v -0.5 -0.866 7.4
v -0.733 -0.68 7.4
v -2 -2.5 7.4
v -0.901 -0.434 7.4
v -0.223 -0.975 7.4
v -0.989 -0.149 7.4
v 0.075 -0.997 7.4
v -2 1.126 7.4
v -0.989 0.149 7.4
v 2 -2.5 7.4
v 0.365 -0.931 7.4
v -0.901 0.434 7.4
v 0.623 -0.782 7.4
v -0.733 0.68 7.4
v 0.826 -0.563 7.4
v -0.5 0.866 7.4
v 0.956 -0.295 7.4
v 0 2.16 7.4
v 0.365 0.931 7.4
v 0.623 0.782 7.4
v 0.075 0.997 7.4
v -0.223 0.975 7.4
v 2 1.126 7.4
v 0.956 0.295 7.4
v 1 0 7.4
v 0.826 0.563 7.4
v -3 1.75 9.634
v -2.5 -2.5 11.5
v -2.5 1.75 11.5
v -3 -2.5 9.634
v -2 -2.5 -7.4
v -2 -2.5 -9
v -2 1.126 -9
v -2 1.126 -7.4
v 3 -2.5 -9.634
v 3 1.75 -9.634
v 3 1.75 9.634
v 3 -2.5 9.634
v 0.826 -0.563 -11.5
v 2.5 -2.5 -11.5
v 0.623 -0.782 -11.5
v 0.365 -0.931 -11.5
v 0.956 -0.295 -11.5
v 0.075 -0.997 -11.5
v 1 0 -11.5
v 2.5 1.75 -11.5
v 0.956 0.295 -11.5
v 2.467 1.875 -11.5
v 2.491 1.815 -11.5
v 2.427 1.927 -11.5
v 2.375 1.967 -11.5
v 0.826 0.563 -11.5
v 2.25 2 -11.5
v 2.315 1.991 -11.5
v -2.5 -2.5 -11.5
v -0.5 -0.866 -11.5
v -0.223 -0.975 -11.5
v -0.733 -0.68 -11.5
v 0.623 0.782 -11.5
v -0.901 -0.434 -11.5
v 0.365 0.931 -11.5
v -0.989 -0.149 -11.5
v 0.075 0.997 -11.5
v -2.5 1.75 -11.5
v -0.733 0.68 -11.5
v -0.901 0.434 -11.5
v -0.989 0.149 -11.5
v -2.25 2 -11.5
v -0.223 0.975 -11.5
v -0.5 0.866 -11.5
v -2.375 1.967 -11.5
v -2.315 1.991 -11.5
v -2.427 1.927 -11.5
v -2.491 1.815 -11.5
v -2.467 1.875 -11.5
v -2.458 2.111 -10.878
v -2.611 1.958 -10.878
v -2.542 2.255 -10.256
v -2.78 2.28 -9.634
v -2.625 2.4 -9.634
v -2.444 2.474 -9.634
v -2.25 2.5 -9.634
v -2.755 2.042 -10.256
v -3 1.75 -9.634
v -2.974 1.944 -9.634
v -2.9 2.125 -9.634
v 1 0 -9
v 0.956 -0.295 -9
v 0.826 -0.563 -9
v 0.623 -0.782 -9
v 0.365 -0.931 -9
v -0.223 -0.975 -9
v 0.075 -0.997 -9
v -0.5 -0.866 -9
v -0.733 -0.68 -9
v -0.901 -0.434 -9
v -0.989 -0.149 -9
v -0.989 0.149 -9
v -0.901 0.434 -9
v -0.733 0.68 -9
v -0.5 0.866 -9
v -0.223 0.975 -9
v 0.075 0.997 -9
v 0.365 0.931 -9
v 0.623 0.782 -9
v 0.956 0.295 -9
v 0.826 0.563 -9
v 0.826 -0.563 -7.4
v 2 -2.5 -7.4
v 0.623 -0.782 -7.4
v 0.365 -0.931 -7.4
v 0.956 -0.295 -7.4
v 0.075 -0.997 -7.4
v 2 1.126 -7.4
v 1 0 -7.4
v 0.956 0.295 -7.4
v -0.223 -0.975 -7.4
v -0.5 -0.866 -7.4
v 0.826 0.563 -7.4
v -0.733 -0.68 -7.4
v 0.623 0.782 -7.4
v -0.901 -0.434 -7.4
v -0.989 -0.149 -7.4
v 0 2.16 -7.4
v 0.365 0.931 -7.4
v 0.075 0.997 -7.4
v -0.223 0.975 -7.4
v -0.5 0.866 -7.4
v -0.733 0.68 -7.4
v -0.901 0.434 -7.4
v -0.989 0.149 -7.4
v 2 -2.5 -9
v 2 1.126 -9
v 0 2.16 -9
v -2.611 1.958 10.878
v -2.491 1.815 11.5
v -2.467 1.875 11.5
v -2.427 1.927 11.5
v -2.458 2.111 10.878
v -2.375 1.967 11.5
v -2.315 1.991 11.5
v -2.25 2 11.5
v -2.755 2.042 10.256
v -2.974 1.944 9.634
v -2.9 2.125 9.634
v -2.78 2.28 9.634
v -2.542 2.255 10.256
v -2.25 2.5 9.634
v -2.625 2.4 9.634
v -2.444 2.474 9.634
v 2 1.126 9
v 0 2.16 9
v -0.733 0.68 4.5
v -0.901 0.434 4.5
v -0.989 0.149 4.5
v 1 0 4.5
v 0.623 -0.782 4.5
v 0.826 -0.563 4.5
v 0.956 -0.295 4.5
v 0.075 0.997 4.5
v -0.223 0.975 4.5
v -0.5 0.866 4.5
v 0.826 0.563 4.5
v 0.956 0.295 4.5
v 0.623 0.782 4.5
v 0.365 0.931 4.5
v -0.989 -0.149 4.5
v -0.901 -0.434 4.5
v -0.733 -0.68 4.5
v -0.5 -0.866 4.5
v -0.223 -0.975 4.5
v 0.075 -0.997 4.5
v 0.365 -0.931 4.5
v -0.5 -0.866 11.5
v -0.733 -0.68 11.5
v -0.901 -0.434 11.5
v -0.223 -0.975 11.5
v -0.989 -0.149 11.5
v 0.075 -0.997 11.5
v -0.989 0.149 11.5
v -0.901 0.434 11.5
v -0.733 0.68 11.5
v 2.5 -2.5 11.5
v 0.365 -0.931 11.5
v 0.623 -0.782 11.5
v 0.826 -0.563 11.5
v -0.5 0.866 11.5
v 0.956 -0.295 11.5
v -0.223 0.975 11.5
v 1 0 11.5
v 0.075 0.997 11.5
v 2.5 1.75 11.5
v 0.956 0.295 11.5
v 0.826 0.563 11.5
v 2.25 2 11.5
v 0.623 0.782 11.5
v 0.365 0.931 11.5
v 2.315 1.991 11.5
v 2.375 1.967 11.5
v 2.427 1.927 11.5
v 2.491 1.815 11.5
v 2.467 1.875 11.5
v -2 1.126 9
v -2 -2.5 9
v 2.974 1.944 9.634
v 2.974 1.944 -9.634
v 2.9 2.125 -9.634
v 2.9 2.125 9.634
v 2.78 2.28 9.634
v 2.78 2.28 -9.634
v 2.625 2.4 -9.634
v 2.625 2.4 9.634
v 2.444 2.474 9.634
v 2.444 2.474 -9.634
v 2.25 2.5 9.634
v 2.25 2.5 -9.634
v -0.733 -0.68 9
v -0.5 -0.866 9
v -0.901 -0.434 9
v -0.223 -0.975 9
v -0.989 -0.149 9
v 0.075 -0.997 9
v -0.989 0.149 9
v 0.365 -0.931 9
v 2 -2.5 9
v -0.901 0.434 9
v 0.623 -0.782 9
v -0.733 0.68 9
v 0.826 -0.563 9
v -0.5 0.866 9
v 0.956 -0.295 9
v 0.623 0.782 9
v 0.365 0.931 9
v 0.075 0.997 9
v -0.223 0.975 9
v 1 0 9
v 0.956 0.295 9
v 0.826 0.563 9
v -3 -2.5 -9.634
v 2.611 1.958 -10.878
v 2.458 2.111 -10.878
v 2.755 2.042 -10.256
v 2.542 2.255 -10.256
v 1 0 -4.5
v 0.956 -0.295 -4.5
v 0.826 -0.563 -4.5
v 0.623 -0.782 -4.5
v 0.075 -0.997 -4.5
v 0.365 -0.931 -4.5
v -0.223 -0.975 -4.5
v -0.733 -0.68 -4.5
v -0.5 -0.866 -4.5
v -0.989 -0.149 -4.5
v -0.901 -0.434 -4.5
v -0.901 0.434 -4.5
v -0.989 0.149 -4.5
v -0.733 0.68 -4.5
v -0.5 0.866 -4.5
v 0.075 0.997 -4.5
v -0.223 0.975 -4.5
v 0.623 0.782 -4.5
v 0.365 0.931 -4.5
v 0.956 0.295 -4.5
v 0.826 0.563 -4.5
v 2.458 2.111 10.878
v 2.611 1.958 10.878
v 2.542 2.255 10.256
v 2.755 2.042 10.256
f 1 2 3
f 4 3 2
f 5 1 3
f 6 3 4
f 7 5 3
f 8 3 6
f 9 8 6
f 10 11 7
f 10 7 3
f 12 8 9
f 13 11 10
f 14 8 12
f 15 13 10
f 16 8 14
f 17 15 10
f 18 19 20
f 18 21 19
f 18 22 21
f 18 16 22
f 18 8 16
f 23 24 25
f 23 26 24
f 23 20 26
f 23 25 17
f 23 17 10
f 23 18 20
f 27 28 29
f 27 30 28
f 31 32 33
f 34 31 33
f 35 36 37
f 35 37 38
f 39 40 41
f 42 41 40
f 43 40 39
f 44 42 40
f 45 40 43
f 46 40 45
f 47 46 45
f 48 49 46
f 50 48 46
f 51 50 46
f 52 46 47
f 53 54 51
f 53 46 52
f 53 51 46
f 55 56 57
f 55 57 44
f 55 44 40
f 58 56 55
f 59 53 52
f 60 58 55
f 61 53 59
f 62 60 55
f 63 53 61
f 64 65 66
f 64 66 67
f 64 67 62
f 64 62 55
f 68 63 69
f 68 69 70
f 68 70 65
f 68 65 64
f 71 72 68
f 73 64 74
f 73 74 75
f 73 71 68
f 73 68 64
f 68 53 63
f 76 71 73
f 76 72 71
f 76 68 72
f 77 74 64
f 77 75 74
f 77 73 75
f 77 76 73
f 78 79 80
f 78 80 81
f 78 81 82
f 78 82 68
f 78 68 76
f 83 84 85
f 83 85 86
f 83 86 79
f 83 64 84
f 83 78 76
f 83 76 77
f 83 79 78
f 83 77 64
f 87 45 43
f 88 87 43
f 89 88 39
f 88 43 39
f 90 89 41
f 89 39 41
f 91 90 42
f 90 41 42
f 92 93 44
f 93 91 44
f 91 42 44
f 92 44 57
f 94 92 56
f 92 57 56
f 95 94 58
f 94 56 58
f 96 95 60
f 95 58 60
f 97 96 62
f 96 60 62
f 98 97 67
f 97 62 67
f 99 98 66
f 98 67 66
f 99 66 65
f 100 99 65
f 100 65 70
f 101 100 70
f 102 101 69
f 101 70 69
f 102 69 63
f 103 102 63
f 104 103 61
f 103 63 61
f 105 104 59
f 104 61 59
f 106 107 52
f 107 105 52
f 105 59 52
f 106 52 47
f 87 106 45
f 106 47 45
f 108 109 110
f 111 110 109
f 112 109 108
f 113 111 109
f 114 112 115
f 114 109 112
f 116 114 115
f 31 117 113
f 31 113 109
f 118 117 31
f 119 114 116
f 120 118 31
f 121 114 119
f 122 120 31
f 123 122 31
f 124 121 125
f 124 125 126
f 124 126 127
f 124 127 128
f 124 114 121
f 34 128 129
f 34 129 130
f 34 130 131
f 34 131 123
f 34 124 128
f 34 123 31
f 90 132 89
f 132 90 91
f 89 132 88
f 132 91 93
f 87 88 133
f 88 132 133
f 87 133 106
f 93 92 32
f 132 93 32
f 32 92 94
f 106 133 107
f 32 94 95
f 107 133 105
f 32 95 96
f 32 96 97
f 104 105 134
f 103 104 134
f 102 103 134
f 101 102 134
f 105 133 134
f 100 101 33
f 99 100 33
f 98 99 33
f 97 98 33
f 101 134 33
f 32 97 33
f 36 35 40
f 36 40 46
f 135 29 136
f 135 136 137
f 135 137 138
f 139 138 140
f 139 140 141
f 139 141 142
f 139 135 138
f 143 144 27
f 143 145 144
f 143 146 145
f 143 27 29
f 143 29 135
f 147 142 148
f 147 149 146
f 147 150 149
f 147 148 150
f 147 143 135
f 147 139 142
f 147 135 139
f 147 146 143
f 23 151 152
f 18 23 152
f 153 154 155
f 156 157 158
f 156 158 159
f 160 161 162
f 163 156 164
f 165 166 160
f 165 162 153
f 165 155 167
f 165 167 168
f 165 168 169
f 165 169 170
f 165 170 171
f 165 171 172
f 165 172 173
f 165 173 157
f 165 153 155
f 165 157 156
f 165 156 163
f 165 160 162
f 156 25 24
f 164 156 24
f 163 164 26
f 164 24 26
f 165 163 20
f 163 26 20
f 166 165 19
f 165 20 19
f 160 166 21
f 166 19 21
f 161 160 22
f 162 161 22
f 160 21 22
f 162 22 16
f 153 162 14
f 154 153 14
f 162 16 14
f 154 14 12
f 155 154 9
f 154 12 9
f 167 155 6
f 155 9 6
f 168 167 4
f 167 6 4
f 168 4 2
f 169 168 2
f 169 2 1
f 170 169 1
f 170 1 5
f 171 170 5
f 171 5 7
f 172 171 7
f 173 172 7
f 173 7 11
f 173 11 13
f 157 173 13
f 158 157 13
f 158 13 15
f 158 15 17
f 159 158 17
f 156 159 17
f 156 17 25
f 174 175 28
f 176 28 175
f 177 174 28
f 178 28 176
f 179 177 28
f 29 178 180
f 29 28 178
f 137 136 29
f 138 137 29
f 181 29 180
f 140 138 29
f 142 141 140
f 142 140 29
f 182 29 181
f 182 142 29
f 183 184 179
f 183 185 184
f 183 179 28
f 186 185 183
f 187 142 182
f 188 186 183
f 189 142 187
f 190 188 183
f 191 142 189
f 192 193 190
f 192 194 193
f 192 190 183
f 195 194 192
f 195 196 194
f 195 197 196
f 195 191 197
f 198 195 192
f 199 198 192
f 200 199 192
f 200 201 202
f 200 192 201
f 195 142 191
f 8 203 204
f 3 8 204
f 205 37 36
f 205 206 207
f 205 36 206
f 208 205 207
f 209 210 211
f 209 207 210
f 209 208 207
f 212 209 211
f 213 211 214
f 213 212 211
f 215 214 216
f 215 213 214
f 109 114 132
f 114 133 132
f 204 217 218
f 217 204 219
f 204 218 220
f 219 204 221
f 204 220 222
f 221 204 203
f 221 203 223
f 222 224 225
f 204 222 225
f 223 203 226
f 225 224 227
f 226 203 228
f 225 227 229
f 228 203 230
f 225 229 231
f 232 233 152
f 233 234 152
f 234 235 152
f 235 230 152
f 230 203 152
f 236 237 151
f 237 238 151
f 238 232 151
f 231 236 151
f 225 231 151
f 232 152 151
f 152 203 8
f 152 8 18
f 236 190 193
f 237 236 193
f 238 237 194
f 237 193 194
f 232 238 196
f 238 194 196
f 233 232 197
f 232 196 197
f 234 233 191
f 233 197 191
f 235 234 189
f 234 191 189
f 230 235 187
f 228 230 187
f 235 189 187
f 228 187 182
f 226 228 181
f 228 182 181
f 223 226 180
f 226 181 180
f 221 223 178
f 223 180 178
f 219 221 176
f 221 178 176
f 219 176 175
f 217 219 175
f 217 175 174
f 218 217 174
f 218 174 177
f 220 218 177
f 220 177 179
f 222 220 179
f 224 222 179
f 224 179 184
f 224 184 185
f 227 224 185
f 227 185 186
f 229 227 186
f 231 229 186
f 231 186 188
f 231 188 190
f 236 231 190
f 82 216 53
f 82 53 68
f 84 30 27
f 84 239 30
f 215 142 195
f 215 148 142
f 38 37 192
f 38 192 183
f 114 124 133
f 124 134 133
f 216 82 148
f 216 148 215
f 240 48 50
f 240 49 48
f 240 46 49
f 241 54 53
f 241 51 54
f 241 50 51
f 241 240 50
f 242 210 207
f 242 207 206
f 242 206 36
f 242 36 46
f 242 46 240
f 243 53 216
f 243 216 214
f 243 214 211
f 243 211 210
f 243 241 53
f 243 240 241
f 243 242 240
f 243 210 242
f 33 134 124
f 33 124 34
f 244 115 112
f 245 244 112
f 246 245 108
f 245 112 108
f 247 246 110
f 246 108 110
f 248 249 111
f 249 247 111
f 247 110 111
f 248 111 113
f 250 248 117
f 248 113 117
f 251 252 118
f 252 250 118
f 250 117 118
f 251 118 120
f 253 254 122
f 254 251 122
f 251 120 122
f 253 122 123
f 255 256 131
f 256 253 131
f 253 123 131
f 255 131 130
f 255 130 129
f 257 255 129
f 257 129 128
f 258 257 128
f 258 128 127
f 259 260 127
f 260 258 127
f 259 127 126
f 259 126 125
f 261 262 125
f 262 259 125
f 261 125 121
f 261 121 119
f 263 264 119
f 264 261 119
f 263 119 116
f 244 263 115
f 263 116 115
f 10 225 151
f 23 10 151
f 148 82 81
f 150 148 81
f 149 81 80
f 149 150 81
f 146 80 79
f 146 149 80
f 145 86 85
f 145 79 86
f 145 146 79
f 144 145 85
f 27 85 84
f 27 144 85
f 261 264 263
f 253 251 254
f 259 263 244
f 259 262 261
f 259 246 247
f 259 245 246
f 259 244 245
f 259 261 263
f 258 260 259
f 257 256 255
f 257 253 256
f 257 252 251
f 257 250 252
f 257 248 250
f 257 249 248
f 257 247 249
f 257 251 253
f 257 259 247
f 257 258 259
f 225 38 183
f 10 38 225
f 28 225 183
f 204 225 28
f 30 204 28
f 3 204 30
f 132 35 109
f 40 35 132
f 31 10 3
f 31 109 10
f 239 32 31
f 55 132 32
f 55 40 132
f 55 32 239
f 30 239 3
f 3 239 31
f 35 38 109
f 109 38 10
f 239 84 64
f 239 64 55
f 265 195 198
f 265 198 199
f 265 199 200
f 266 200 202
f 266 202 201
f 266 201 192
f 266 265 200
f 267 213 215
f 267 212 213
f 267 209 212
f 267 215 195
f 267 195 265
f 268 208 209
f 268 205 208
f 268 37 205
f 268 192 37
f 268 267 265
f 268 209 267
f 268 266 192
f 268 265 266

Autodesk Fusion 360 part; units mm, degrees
sketch "Sketch1" plane through (0, 0, 0) normal (0, 0, 1) x (1, 0, 0)
  line L0 (3, -2.5) -> (-3, -2.5)
  line L1 (-3, -2.5) -> (-3, 2.5)
  line L2 (-3, 2.5) -> (3, 2.5)
  line L3 (3, 2.5) -> (3, -2.5)
  line L4 (3, -2.5) -> (-3, 2.5) construction
  line L5 (-3, -2.5) -> (3, 2.5) construction
  dimension "dWidth" = 6
  dimension "d2" = 5
extrude "Extrude1" add sketch "Sketch1" along normal blind 11.5
sketch "Sketch2" plane through (0, 0, 11.5) normal (0, 0, 1) x (1, 0, 0)
  line L0 (3, 2.5) -> (-3, 2.5)
  line L1 (-3, 2.5) -> (-3, -2.5)
  line L2 (-3, -2.5) -> (3, -2.5)
  line L3 (3, -2.5) -> (3, 2.5)
  circle A0 centre (0, 0) radius 1
  dimension "d5" = 2
extrude "Extrude2" cut sketch "Sketch2" against normal blind 7 contours A0
ref_plane "WorkPlane1" through (0, 0, 9) normal (0, 0, 1) x (1, 0, 0)
sketch "Sketch3" plane through (0, 0, 9) normal (0, 0, 1) x (1, 0, 0)
  line L0 (2, -2.16) -> (-2, -2.16) construction
  line L1 (-2, -2.16) -> (-2, 2.16) construction
  line L2 (-2, 2.16) -> (2, 2.16) construction
  line L3 (2, 2.16) -> (2, -2.16) construction
  line L4 (2, -2.16) -> (-2, 2.16) construction
  line L5 (-2, -2.16) -> (2, 2.16) construction
  line L6 (-2, 0) -> (2, 0) construction
  line L7 (2, 1.1258) -> (2, -1.1258)
  line L8 (-2, 1.1258) -> (-2, -1.1258)
  line L9 (0, 2.16) -> (0, -2.16) construction
  line L10 (-2, 1.1258) -> (0, 2.16)
  line L11 (2, 1.1258) -> (0, 2.16)
  line L12 (-2, -1.1258) -> (0, -2.16) construction
  line L13 (0, -2.16) -> (2, -1.1258) construction
  line L14 (-2, -1.1258) -> (-2, -2.5)
  line L15 (-2, -2.5) -> (2, -2.5)
  line L16 (2, -2.5) -> (2, -1.1258)
  line L17 (3, -2.5) -> (-3, -2.5)
  dimension "d9" = 4
  dimension "d10" = 4.32
extrude "Extrude3" cut sketch "Sketch3" against normal blind 1.6
fillet "Fillet1" radius 0.75 2 edges at (-3, 2.5, 5.75) (3, 2.5, 5.75)
chamfer "Chamfer2" distance 0.5 angle 75 2 edges at (3, -0.375, 11.5) (-3, -0.375, 11.5) measured on face at (-2.3296, -0.2997, 11.5) measured on face at (-2.3296, -0.2997, 11.5) tangent chain off
mirror "Mirror2" about plane through (0, 0, 0) normal (0, 0, 1) of bodies 1 merged
properties part number "Configuration 2"
